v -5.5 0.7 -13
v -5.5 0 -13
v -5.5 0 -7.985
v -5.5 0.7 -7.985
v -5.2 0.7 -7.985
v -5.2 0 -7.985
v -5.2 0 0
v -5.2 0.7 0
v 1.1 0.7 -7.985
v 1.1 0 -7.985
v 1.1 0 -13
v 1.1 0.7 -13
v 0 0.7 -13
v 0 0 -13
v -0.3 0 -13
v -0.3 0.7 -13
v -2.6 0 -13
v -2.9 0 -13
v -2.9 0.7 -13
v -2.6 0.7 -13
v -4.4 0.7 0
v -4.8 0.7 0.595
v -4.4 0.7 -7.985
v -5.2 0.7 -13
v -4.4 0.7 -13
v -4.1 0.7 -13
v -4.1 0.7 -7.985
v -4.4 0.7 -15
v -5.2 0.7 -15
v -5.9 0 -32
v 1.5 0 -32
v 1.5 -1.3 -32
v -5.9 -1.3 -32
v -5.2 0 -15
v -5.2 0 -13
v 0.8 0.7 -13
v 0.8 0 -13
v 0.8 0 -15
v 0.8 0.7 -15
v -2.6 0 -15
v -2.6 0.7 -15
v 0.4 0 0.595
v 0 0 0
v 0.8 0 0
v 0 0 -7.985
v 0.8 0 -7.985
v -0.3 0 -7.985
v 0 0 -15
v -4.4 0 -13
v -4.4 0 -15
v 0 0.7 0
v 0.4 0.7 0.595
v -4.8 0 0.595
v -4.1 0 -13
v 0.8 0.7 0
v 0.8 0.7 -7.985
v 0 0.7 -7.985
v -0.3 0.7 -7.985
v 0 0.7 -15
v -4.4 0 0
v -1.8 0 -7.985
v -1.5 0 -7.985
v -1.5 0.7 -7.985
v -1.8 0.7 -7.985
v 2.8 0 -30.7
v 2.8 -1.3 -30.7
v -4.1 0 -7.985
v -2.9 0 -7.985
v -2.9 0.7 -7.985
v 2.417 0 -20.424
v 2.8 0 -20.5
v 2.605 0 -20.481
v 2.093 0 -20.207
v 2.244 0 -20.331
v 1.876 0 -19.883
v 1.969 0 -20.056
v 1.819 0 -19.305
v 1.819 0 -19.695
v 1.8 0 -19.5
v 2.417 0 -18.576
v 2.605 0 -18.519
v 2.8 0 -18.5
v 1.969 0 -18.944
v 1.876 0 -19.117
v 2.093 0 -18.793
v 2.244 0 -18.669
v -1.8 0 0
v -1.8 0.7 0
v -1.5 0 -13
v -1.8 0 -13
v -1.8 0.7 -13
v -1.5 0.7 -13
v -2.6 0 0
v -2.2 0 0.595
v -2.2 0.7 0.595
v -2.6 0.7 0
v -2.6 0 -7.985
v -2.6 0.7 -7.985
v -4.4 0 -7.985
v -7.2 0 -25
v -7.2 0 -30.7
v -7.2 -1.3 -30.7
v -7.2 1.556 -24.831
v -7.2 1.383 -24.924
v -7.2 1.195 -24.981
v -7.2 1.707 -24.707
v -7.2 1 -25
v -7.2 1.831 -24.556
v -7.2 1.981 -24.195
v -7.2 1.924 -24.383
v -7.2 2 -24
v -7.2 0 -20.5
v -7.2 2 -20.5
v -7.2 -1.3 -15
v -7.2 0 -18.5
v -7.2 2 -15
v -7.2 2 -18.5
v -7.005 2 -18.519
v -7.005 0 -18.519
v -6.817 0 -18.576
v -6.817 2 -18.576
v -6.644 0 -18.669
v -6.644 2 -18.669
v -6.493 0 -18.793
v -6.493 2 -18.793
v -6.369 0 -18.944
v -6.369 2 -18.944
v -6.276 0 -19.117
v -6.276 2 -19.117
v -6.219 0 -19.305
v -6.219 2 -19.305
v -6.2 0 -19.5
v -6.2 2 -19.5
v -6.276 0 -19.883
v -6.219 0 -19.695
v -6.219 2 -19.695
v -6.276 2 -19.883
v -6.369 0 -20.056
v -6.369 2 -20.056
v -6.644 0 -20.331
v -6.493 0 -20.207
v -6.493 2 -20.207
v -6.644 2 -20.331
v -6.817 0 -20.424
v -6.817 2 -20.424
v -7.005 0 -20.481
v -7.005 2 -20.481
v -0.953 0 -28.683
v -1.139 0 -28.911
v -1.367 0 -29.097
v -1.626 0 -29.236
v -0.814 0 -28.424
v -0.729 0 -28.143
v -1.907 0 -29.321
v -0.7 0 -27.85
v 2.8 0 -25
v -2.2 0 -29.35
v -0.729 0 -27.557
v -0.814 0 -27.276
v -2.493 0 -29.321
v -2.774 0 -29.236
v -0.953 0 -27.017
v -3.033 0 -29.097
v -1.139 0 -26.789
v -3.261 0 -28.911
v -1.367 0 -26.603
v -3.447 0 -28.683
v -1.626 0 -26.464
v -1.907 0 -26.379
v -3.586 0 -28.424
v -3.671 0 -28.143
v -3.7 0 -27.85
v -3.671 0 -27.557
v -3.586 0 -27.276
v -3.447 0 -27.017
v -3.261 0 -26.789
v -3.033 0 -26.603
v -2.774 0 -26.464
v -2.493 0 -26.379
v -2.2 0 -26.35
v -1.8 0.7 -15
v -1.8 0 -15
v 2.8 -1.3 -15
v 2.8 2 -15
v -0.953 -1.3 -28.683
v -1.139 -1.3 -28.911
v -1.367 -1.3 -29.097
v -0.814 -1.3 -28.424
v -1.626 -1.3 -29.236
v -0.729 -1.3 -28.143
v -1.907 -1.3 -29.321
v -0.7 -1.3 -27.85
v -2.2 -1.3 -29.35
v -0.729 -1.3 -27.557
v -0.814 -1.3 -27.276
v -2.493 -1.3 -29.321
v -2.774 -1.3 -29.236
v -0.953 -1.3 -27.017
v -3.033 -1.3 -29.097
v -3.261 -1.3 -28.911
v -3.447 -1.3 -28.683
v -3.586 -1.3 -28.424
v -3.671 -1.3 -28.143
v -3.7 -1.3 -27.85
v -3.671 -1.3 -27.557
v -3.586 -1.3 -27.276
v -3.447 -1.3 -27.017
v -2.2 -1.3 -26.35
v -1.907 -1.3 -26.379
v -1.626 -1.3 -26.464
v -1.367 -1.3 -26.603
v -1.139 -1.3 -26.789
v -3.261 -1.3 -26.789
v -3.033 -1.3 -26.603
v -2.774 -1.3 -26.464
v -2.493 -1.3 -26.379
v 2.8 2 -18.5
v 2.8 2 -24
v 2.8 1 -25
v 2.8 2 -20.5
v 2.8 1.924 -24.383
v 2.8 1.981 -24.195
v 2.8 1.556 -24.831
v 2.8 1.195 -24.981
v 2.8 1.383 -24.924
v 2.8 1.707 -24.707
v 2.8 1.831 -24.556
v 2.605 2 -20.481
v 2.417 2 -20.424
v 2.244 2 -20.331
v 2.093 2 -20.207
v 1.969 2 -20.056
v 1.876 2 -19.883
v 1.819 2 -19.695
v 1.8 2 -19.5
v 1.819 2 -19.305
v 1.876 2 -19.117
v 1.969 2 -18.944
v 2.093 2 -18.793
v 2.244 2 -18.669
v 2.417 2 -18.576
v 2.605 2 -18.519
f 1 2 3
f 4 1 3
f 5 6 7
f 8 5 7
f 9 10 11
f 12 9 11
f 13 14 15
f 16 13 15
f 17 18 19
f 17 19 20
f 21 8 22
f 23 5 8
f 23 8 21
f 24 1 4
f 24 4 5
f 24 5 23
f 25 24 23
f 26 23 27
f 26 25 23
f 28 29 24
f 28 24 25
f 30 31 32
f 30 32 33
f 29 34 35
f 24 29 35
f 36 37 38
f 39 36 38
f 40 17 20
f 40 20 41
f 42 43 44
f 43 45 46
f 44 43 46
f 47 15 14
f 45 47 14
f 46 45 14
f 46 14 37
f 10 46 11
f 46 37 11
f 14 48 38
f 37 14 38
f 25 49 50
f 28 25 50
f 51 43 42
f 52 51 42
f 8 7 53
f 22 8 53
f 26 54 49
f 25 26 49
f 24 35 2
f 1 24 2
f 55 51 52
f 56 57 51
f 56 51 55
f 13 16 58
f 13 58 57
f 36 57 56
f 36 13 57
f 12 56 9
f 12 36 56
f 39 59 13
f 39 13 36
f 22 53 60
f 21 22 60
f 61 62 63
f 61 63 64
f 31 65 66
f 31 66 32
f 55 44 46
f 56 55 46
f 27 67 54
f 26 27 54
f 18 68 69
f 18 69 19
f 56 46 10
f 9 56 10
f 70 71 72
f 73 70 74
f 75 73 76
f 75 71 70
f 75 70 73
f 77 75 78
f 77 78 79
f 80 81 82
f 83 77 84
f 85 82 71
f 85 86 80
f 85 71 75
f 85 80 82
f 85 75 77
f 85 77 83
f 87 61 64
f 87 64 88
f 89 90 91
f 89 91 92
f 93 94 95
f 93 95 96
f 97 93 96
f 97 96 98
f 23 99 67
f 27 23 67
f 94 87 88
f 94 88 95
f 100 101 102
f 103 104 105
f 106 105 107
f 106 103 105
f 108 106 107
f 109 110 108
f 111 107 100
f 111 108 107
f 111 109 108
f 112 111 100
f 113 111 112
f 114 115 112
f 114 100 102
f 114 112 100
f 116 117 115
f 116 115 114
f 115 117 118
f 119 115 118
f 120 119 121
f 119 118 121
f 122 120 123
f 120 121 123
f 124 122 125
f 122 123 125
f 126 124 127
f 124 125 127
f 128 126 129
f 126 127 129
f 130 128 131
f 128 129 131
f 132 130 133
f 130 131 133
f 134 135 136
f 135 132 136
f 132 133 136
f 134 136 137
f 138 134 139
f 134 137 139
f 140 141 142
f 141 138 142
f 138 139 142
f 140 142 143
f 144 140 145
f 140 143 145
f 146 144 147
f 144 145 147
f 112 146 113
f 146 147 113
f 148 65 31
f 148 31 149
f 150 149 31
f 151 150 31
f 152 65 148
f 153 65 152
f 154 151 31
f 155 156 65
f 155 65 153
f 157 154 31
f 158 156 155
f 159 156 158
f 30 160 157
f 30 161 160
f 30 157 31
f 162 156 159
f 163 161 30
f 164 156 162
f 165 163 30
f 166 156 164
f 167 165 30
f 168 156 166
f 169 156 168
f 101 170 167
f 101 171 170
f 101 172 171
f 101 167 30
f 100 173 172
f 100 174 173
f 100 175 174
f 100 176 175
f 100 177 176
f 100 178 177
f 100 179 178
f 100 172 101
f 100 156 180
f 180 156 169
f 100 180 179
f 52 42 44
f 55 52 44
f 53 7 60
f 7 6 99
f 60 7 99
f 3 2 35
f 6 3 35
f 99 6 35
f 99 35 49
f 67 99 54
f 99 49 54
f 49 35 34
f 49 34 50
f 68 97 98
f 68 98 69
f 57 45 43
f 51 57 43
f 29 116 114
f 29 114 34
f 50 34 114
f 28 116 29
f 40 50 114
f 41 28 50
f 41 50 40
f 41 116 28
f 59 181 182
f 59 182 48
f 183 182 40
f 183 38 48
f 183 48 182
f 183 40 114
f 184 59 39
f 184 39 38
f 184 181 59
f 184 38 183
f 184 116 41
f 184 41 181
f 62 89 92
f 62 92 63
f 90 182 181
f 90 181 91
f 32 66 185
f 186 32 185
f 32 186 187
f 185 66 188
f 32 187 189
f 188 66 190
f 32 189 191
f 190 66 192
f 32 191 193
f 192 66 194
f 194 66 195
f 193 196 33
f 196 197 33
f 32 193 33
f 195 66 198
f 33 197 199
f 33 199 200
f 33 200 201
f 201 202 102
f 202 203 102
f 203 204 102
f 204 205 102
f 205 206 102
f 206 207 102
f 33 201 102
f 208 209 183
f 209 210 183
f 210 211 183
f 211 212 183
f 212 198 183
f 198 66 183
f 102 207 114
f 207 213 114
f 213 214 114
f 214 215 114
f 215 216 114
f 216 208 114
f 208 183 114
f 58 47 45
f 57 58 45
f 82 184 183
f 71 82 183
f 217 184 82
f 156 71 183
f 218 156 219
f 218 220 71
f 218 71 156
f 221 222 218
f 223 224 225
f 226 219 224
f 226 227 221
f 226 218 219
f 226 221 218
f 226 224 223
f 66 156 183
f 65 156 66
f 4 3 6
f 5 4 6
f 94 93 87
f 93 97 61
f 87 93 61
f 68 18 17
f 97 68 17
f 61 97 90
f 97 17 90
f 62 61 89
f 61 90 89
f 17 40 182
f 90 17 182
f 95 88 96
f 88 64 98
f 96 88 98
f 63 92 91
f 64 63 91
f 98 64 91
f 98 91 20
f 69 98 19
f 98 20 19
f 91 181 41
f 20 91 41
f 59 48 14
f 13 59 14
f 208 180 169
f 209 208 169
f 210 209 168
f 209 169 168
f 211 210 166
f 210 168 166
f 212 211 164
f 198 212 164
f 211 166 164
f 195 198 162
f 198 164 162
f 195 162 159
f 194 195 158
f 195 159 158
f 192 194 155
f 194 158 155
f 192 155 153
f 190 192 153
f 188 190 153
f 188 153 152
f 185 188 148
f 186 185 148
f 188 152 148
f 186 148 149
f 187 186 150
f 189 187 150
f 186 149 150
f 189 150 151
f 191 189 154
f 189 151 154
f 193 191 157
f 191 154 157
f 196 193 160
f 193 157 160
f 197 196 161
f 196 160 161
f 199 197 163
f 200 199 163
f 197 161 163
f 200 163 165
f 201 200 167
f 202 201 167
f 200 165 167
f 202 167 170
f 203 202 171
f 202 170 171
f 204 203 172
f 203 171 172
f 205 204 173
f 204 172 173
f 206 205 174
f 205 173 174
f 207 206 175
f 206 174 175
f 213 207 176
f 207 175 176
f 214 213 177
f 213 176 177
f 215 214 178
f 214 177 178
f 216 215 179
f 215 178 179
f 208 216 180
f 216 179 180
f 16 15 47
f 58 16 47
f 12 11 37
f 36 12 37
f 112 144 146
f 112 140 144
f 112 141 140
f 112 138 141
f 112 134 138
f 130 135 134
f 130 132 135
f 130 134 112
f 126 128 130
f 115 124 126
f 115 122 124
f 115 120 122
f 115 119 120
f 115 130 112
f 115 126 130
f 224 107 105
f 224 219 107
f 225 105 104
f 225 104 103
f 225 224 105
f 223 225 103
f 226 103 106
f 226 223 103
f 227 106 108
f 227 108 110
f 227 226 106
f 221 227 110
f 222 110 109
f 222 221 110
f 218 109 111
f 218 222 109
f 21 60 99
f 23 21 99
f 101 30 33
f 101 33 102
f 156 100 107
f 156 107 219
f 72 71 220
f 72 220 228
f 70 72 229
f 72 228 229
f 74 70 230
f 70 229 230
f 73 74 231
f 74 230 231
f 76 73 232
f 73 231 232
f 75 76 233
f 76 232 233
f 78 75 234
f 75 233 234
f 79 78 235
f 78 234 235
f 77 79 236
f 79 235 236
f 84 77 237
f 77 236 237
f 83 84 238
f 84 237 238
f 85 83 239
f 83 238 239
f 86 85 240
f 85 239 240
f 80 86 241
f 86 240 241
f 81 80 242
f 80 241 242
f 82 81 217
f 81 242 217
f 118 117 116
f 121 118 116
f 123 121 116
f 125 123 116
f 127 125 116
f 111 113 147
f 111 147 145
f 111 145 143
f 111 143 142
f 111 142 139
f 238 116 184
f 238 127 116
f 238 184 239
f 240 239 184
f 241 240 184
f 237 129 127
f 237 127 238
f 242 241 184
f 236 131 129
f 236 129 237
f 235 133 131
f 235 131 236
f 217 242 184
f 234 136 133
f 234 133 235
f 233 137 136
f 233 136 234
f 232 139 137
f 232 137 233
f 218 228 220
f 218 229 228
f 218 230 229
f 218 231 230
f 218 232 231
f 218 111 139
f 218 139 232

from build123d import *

# Parameters (mm, degrees)
BOSS_EXTRUDE1_DEPTH   = 0.7
BOSS_EXTRUDE1_2_DEPTH = 0.7
BOSS_EXTRUDE1_3_DEPTH = 0.7
SKETCH6_W             = 10
SKETCH6_H             = 10
BOSS_EXTRUDE2_DEPTH   = 2
FILLET1_R             = 1
SKETCH7_R             = 1
CUT_EXTRUDE2_DEPTH    = 2
BOSS_EXTRUDE3_DEPTH   = 1.3
SKETCH9_R             = 1.5
CUT_EXTRUDE3_DEPTH    = 1.3


with BuildPart() as part:
    # Sketch1 → Boss-Extrude1 (new body)
    with BuildSketch(Plane(origin=(0, 0, 0), x_dir=(1, 0, 0), z_dir=(0, 1, 0))):
        Polygon((0, 0), (0.4, -0.594509979), (0.8, 0), (0.8, 7.984975303), (1.1, 7.984975303), (1.1, 13), (0.8, 13), (0.8, 15), (0, 15), (0, 13), (-0.3, 13), (-0.3, 7.984975303), (0, 7.984975303), align=None)
    extrude(amount=BOSS_EXTRUDE1_DEPTH)



with BuildPart() as body_2:
    # Sketch1 → Boss-Extrude1 2 (new body)
    with BuildSketch(Plane(origin=(0, 0, 0), x_dir=(1, 0, 0), z_dir=(0, 1, 0))):
        Polygon((-2.6, 7.984975303), (-2.9, 7.984975303), (-2.9, 13), (-2.6, 13), (-2.6, 15), (-1.8, 15), (-1.8, 13), (-1.5, 13), (-1.5, 7.984975303), (-1.8, 7.984975303), (-1.8, 0), (-2.2, -0.594509979), (-2.6, 0), align=None)
    extrude(amount=BOSS_EXTRUDE1_2_DEPTH)


with BuildPart() as body_3:
    # Sketch1 → Boss-Extrude1 3 (new body)
    with BuildSketch(Plane(origin=(0, 0, 0), x_dir=(1, 0, 0), z_dir=(0, 1, 0))):
        Polygon((-5.2, 0), (-4.8, -0.594509979), (-4.4, 0), (-4.4, 7.984975303), (-4.1, 7.984975303), (-4.1, 13), (-4.4, 13), (-4.4, 15), (-5.2, 15), (-5.2, 13), (-5.5, 13), (-5.5, 7.984975303), (-5.2, 7.984975303), align=None)
    extrude(amount=BOSS_EXTRUDE1_3_DEPTH)


with BuildPart() as part_1:
    add(part.part)

    add(body_2.part)  # Boss-Extrude2 merges body 2

    add(body_3.part)  # Boss-Extrude2 merges body 3
    # Sketch6 → Boss-Extrude2 (add)
    with BuildSketch(Plane(origin=(0, 0, 0), x_dir=(1, 0, 0), z_dir=(0, 1, 0))):
        with Locations((-2.2, 20)):
            Rectangle(SKETCH6_W, SKETCH6_H)
    extrude(amount=BOSS_EXTRUDE2_DEPTH)

    # Fillet1
    fillet1_edges = [part_1.edges().sort_by_distance(p)[0] for p in [
        (-2.2, 2, -25),
    ]]
    fillet(fillet1_edges, radius=FILLET1_R)

    # Sketch7 → Cut-Extrude2 (cut)
    with BuildSketch(Plane(origin=(0, 2, 0), x_dir=(1, 0, 0), z_dir=(0, 1, 0))):
        with Locations((-7.2, 19.5)):
            Circle(SKETCH7_R)
        with Locations((2.8, 19.5)):
            Circle(SKETCH7_R)
    extrude(amount=-CUT_EXTRUDE2_DEPTH, mode=Mode.SUBTRACT)

    # Sketch8 → Boss-Extrude3 (add)
    with BuildSketch(Plane.XZ):
        Polygon((-7.2, -15), (2.8, -15), (2.8, -30.7), (1.5, -32), (-5.9, -32), (-7.2, -30.7), align=None)
    extrude(amount=BOSS_EXTRUDE3_DEPTH)

    # Sketch9 → Cut-Extrude3 (cut)
    with BuildSketch(Plane(origin=(0, 0, 0), x_dir=(1, 0, 0), z_dir=(0, 1, 0))):
        with Locations(Location((-2.2, 27.85, 0), (0, 0, 270))):
            Circle(SKETCH9_R)
    extrude(amount=-CUT_EXTRUDE3_DEPTH, mode=Mode.SUBTRACT)


solid = part_1.part
